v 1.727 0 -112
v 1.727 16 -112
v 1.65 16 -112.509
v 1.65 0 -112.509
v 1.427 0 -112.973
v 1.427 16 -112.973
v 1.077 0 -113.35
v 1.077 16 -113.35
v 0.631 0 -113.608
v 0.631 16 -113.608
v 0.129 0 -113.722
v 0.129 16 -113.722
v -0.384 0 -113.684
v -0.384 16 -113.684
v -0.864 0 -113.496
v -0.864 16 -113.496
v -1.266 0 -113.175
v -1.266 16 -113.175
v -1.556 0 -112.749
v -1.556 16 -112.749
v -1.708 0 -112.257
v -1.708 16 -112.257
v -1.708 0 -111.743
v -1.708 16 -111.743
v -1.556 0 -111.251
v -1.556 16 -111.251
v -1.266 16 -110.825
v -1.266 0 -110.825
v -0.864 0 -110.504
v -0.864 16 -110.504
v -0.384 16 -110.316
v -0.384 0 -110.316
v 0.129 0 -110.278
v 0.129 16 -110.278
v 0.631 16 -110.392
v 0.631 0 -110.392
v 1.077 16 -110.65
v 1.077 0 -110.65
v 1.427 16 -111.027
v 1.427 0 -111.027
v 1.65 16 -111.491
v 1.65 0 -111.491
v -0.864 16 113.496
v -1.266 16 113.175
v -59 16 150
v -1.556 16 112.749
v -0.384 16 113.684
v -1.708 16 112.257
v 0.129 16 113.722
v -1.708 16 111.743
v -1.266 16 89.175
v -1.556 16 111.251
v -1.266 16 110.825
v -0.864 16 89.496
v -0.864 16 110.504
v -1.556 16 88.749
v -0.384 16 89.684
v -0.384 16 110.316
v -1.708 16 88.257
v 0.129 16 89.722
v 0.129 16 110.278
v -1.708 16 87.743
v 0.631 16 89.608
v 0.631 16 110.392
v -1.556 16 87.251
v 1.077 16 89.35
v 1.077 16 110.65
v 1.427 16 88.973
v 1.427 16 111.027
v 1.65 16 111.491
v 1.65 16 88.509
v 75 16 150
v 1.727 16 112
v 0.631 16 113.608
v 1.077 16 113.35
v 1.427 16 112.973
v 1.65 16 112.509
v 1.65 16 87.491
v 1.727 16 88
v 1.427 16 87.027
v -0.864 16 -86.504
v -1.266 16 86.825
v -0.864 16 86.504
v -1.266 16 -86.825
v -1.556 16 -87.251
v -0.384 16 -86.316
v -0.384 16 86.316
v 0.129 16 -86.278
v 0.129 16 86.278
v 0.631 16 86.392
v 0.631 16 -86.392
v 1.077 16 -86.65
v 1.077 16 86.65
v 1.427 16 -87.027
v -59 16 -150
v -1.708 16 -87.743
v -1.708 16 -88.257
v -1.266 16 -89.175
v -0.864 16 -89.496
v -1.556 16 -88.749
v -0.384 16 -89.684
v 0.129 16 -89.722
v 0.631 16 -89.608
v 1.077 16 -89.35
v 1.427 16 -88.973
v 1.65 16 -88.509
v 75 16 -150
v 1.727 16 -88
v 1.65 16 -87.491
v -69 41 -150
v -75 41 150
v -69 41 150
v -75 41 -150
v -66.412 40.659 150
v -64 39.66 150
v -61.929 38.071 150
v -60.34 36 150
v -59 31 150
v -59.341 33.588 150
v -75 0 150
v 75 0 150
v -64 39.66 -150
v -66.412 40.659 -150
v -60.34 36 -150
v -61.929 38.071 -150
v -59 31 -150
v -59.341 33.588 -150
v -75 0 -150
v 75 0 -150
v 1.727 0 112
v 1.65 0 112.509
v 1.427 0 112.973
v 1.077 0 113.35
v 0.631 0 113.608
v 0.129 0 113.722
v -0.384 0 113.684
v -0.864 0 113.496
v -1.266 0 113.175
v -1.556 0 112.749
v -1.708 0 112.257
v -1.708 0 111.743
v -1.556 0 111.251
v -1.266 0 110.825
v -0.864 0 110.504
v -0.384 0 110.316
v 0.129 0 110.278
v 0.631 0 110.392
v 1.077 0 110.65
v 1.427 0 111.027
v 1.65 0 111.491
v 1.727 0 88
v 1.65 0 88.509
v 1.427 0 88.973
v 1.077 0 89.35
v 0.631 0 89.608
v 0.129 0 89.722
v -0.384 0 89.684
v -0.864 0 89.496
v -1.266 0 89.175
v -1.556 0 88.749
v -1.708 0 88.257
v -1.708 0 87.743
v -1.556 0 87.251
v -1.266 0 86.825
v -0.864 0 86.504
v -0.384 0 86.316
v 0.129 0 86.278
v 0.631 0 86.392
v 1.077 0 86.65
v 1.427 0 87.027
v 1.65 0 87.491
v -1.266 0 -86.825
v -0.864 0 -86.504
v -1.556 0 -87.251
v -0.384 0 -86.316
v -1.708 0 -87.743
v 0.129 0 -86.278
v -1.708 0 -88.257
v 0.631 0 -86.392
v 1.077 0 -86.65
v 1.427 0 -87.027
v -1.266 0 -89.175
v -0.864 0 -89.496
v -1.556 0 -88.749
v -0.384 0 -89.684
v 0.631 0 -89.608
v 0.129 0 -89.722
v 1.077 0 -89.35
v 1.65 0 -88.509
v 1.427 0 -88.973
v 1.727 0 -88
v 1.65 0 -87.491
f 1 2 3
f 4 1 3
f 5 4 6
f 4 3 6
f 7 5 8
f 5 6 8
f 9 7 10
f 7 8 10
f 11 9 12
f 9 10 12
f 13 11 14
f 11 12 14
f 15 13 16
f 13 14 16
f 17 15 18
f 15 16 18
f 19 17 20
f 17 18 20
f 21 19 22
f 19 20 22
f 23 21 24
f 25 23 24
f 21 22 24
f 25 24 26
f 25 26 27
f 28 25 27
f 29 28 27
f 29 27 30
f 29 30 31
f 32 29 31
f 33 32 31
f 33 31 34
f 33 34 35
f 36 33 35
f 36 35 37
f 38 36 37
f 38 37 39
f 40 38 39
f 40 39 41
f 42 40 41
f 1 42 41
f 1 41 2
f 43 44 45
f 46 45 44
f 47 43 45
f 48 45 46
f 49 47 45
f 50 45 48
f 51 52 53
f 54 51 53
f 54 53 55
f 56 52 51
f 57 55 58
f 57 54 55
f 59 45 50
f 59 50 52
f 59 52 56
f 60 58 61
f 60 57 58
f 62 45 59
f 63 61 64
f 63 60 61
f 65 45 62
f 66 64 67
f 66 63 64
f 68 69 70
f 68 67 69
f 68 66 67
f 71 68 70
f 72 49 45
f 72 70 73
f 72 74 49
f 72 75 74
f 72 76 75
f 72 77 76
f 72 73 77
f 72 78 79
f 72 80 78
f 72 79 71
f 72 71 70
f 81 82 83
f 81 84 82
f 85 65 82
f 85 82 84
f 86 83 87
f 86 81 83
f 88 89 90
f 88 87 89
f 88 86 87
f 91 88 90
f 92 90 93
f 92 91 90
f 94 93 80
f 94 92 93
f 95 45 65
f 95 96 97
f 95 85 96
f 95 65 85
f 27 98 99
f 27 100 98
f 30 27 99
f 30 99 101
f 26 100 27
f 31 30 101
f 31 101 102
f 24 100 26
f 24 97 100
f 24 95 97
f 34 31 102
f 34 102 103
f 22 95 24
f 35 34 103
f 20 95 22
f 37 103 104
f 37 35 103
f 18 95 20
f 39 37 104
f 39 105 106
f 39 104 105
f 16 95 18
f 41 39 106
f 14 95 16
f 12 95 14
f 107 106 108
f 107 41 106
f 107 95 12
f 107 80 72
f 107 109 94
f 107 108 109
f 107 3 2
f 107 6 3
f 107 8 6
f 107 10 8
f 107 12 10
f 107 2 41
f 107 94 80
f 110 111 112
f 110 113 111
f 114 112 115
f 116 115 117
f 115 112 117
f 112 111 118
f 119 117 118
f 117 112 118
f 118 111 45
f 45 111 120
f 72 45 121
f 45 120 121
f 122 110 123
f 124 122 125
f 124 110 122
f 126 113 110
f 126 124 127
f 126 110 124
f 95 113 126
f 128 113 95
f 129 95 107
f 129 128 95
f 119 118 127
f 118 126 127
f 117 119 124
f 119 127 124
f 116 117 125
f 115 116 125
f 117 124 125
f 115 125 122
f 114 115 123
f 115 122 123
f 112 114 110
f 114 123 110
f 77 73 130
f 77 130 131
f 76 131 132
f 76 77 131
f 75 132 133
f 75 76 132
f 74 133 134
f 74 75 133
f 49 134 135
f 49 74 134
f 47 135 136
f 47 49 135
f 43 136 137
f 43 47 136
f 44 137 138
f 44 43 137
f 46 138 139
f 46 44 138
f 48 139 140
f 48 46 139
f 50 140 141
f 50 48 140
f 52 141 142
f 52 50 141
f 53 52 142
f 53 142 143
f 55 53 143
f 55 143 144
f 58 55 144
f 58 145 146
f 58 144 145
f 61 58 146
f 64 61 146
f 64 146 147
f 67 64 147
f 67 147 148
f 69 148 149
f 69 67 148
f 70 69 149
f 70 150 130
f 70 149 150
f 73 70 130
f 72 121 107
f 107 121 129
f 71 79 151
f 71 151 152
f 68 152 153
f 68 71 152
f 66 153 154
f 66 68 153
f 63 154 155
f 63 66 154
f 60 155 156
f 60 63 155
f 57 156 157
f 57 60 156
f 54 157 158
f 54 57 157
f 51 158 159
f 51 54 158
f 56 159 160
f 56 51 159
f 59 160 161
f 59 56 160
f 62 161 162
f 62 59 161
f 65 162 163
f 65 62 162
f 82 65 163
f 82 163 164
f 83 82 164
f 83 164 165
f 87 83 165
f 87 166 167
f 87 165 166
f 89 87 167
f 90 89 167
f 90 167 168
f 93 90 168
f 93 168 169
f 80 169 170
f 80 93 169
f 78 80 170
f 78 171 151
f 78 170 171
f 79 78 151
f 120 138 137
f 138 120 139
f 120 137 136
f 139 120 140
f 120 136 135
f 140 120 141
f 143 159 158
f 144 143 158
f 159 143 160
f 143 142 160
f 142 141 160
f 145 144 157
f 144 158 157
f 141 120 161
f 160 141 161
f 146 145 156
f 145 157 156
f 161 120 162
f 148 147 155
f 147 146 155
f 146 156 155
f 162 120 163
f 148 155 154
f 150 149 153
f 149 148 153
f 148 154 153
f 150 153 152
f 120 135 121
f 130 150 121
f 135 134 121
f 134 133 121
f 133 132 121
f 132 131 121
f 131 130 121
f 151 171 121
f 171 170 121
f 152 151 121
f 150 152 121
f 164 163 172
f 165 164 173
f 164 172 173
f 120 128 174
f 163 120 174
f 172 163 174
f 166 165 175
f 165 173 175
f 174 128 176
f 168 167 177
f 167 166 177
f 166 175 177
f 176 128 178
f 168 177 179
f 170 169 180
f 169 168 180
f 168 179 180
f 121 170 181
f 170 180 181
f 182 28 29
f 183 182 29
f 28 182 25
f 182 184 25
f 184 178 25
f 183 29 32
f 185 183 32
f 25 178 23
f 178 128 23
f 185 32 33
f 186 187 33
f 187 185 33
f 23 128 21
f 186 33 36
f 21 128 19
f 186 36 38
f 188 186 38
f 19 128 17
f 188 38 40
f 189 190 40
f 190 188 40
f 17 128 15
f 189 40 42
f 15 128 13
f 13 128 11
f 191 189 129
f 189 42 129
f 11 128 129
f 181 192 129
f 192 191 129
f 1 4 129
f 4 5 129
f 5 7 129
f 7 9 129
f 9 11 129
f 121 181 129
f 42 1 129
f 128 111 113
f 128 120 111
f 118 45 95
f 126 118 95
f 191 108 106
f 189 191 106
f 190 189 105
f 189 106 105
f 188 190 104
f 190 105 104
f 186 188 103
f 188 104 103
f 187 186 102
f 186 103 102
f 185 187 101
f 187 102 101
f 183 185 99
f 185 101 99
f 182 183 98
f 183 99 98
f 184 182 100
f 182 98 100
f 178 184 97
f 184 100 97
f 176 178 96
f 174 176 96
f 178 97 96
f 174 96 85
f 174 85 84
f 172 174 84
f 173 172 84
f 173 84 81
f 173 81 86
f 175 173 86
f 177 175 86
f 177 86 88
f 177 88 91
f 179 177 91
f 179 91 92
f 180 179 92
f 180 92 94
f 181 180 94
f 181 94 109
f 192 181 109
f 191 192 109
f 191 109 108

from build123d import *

# Parameters (mm, degrees)
SKETCH1_W             = 150
SKETCH1_H             = 300
BOSS_EXTRUDE1_DEPTH   = 16
SKETCH2_W             = 16
SKETCH2_H             = 300
BOSS_EXTRUDE2_DEPTH   = 25
FILLET1_R             = 10
F_8_36_TAPPED_HOLE1_D = 3.4544


with BuildPart() as part:
    # Sketch1 → Boss-Extrude1 (new body)
    with BuildSketch(Plane(origin=(0, 0, 0), x_dir=(1, 0, 0), z_dir=(0, 1, 0))):
        Rectangle(SKETCH1_W, SKETCH1_H)
    extrude(amount=BOSS_EXTRUDE1_DEPTH)

    # Sketch2 → Boss-Extrude2 (add)
    with BuildSketch(Plane(origin=(0, 16, 0), x_dir=(1, 0, 0), z_dir=(0, 1, 0))):
        with Locations((-67, 0)):
            Rectangle(SKETCH2_W, SKETCH2_H)
    extrude(amount=BOSS_EXTRUDE2_DEPTH)

    # Fillet1
    fillet1_edges = [part.edges().sort_by_distance(p)[0] for p in [
        (-59, 41, 0),
    ]]
    fillet(fillet1_edges, radius=FILLET1_R)

    # #8-36 Tapped Hole1 (through all)
    with Locations(Plane(origin=(0, 0, 0), x_dir=(-1, 0, 0), z_dir=(0, -1, 0))):
        with Locations((0, 112), (0, 88)):
            f_8_36_tapped_hole1 = Hole(F_8_36_TAPPED_HOLE1_D / 2)

    # Mirror1: #8-36 Tapped Hole1 across plane
    add(f_8_36_tapped_hole1.mirror(Plane.XY), mode=Mode.SUBTRACT)


solid = part.part
